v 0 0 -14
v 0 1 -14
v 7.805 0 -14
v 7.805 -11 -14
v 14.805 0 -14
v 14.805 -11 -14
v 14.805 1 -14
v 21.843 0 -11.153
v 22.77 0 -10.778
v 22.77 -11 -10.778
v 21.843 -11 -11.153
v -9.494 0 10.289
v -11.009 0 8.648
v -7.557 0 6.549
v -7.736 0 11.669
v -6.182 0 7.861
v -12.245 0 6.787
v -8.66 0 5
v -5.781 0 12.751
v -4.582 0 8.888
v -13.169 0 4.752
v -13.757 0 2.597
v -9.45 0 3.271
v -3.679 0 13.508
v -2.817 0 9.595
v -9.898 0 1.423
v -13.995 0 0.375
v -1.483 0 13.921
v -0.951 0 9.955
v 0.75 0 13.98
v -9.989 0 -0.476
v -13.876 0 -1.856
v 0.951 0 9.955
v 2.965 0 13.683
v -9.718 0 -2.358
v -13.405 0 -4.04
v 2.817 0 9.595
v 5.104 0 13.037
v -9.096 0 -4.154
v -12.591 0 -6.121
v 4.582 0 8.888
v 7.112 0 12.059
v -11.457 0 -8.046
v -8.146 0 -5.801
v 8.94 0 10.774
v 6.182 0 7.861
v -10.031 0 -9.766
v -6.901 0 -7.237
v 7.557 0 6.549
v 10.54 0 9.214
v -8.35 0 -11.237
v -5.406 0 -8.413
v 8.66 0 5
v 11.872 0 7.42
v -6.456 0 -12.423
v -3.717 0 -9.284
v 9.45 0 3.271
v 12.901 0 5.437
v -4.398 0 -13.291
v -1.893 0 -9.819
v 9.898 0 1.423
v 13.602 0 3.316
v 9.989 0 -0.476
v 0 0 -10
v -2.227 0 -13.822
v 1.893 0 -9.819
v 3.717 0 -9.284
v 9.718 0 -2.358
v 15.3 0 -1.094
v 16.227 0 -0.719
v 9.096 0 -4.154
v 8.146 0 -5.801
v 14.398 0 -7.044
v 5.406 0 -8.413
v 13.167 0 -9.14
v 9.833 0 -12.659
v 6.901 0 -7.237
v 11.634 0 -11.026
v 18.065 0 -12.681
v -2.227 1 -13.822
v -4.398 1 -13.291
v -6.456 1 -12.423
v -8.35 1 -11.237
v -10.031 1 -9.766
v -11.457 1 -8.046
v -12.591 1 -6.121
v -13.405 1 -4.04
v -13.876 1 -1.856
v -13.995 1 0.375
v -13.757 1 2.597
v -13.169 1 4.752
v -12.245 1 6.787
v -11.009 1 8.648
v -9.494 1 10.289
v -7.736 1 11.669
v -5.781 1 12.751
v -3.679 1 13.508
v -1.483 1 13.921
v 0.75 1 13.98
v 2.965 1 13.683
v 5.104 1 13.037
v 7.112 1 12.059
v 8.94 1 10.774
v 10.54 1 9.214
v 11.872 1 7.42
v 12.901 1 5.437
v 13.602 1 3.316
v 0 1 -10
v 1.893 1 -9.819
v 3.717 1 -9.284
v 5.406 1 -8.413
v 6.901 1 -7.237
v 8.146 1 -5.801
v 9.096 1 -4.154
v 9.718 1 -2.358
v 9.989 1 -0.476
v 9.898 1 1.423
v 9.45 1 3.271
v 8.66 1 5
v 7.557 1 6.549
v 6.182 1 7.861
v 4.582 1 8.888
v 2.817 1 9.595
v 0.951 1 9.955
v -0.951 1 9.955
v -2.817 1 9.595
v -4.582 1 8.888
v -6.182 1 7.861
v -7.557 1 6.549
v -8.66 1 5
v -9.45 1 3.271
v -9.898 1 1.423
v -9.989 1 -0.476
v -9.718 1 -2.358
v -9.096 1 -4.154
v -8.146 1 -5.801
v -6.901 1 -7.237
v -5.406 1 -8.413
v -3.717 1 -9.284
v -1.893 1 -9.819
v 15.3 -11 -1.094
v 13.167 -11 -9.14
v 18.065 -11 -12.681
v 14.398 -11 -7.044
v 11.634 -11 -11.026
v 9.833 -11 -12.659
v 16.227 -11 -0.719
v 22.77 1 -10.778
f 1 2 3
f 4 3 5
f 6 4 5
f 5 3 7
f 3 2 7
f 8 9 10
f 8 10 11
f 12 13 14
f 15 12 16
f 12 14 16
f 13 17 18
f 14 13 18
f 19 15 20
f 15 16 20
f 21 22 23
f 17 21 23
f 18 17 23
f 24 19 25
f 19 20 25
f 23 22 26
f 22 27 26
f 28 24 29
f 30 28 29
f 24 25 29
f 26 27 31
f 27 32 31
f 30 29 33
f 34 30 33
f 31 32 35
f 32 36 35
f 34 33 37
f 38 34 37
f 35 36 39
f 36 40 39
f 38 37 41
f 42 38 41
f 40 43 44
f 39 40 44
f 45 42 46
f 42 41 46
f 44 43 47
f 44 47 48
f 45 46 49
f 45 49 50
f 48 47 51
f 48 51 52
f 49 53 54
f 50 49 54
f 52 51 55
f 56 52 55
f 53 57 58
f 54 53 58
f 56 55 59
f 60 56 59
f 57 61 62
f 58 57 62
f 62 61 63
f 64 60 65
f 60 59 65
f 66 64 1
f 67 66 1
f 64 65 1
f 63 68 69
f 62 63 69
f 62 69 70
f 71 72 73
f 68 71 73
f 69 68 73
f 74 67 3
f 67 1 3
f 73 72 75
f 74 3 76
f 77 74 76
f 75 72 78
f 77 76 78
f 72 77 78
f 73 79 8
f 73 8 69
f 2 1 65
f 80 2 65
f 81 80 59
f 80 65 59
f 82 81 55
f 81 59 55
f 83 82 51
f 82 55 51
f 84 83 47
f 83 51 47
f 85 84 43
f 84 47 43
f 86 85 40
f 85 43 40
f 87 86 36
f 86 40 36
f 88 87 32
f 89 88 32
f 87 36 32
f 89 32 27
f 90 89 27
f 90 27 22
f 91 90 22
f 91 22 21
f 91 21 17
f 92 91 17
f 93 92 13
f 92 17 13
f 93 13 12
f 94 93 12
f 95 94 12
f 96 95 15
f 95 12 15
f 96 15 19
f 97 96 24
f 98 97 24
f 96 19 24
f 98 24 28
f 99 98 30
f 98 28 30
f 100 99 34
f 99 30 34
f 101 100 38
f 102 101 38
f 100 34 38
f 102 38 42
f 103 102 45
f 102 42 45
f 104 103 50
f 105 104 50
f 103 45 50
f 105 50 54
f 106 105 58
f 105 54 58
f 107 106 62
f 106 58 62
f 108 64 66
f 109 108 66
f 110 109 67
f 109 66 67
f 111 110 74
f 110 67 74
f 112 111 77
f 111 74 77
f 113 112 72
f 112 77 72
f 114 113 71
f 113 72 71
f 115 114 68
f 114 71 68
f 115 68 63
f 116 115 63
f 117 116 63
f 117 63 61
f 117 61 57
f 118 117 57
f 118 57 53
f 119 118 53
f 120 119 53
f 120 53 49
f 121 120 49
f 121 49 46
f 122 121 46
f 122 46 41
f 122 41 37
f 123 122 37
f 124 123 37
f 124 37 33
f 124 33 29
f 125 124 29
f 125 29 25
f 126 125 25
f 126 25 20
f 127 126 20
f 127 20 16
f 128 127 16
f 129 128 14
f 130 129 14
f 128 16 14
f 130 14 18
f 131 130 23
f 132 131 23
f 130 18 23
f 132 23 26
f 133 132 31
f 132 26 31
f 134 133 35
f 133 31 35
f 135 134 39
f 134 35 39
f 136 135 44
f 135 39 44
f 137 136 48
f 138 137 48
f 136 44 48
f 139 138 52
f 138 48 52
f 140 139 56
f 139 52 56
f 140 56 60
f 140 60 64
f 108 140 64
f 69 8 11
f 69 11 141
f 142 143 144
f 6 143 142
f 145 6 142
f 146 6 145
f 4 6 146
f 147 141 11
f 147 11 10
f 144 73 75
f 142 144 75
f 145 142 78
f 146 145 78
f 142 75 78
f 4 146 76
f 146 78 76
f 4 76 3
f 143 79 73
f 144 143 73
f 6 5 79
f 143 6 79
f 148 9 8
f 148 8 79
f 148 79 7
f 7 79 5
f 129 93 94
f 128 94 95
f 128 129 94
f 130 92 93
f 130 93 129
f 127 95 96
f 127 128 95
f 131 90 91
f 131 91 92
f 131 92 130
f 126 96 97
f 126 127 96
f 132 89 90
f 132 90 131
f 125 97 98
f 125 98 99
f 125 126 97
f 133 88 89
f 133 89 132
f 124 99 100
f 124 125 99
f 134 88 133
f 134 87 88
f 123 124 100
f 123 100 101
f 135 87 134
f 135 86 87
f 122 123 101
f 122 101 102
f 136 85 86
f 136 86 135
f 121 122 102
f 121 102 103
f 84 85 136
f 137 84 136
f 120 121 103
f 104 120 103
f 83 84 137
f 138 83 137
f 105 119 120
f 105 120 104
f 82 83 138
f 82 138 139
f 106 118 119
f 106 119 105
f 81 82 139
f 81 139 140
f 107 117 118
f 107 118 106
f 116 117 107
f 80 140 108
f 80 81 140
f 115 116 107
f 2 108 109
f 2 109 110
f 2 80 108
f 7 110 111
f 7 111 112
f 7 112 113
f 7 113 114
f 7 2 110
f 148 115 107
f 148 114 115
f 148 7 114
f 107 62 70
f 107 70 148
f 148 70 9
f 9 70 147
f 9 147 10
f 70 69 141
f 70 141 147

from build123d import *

# Parameters (mm, degrees)
SKETCH1_R           = 14
BOSS_EXTRUDE1_DEPTH = 1
BOSS_EXTRUDE2_DEPTH = 11
BOSS_EXTRUDE3_DEPTH = 11
SKETCH4_R           = 10
CUT_EXTRUDE1_DEPTH  = 11


with BuildPart() as part:
    # Sketch1 → Boss-Extrude1 (new body)
    with BuildSketch(Plane(origin=(0, 0, 0), x_dir=(1, 0, 0), z_dir=(0, 1, 0))):
        Circle(SKETCH1_R)
        with BuildLine():
            Line((14.805399496, 14), (0, 14))
            ThreePointArc((0, 14), (9.899494937, 9.899494937), (14, 0))
            ThreePointArc((14, 0), (13.900075645, -1.66969969), (13.601728992, -3.31556457))
            Line((13.601728992, -3.31556457), (22.770248109, 10.778060096))
            Line((22.770248109, 10.778060096), (14.805399496, 14))
        make_face()
    extrude(amount=BOSS_EXTRUDE1_DEPTH)

    # Sketch2 → Boss-Extrude2 (add)
    with BuildSketch(Plane(origin=(0, 0, 0), x_dir=(-1, 0, 0), z_dir=(0, -1, 0))):
        Polygon((-22.770248109, 10.778060096), (-21.843223298, 11.153060096), (-15.299518751, 1.094236567), (-16.226543561, 0.719236567), align=None)
    extrude(amount=BOSS_EXTRUDE2_DEPTH)

    # Sketch3 → Boss-Extrude3 (add)
    with BuildSketch(Plane(origin=(0, 0, 0), x_dir=(-1, 0, 0), z_dir=(0, -1, 0))):
        with BuildLine():
            Line((-18.06544552, 12.681246451), (-14.398150781, 7.043970142))
            ThreePointArc((-14.398150781, 7.043970142), (-11.63382994, 11.026253317), (-7.805399496, 14))
            Line((-7.805399496, 14), (-14.805399496, 14))
            Line((-14.805399496, 14), (-18.06544552, 12.681246451))
        make_face()
    extrude(amount=BOSS_EXTRUDE3_DEPTH)

    # Sketch4 → Cut-Extrude1 (cut)
    with BuildSketch(Plane.XZ):
        with Locations(Location((0, 0, 0), (0, 0, 270))):
            Circle(SKETCH4_R)
    extrude(amount=-CUT_EXTRUDE1_DEPTH, mode=Mode.SUBTRACT)


solid = part.part
